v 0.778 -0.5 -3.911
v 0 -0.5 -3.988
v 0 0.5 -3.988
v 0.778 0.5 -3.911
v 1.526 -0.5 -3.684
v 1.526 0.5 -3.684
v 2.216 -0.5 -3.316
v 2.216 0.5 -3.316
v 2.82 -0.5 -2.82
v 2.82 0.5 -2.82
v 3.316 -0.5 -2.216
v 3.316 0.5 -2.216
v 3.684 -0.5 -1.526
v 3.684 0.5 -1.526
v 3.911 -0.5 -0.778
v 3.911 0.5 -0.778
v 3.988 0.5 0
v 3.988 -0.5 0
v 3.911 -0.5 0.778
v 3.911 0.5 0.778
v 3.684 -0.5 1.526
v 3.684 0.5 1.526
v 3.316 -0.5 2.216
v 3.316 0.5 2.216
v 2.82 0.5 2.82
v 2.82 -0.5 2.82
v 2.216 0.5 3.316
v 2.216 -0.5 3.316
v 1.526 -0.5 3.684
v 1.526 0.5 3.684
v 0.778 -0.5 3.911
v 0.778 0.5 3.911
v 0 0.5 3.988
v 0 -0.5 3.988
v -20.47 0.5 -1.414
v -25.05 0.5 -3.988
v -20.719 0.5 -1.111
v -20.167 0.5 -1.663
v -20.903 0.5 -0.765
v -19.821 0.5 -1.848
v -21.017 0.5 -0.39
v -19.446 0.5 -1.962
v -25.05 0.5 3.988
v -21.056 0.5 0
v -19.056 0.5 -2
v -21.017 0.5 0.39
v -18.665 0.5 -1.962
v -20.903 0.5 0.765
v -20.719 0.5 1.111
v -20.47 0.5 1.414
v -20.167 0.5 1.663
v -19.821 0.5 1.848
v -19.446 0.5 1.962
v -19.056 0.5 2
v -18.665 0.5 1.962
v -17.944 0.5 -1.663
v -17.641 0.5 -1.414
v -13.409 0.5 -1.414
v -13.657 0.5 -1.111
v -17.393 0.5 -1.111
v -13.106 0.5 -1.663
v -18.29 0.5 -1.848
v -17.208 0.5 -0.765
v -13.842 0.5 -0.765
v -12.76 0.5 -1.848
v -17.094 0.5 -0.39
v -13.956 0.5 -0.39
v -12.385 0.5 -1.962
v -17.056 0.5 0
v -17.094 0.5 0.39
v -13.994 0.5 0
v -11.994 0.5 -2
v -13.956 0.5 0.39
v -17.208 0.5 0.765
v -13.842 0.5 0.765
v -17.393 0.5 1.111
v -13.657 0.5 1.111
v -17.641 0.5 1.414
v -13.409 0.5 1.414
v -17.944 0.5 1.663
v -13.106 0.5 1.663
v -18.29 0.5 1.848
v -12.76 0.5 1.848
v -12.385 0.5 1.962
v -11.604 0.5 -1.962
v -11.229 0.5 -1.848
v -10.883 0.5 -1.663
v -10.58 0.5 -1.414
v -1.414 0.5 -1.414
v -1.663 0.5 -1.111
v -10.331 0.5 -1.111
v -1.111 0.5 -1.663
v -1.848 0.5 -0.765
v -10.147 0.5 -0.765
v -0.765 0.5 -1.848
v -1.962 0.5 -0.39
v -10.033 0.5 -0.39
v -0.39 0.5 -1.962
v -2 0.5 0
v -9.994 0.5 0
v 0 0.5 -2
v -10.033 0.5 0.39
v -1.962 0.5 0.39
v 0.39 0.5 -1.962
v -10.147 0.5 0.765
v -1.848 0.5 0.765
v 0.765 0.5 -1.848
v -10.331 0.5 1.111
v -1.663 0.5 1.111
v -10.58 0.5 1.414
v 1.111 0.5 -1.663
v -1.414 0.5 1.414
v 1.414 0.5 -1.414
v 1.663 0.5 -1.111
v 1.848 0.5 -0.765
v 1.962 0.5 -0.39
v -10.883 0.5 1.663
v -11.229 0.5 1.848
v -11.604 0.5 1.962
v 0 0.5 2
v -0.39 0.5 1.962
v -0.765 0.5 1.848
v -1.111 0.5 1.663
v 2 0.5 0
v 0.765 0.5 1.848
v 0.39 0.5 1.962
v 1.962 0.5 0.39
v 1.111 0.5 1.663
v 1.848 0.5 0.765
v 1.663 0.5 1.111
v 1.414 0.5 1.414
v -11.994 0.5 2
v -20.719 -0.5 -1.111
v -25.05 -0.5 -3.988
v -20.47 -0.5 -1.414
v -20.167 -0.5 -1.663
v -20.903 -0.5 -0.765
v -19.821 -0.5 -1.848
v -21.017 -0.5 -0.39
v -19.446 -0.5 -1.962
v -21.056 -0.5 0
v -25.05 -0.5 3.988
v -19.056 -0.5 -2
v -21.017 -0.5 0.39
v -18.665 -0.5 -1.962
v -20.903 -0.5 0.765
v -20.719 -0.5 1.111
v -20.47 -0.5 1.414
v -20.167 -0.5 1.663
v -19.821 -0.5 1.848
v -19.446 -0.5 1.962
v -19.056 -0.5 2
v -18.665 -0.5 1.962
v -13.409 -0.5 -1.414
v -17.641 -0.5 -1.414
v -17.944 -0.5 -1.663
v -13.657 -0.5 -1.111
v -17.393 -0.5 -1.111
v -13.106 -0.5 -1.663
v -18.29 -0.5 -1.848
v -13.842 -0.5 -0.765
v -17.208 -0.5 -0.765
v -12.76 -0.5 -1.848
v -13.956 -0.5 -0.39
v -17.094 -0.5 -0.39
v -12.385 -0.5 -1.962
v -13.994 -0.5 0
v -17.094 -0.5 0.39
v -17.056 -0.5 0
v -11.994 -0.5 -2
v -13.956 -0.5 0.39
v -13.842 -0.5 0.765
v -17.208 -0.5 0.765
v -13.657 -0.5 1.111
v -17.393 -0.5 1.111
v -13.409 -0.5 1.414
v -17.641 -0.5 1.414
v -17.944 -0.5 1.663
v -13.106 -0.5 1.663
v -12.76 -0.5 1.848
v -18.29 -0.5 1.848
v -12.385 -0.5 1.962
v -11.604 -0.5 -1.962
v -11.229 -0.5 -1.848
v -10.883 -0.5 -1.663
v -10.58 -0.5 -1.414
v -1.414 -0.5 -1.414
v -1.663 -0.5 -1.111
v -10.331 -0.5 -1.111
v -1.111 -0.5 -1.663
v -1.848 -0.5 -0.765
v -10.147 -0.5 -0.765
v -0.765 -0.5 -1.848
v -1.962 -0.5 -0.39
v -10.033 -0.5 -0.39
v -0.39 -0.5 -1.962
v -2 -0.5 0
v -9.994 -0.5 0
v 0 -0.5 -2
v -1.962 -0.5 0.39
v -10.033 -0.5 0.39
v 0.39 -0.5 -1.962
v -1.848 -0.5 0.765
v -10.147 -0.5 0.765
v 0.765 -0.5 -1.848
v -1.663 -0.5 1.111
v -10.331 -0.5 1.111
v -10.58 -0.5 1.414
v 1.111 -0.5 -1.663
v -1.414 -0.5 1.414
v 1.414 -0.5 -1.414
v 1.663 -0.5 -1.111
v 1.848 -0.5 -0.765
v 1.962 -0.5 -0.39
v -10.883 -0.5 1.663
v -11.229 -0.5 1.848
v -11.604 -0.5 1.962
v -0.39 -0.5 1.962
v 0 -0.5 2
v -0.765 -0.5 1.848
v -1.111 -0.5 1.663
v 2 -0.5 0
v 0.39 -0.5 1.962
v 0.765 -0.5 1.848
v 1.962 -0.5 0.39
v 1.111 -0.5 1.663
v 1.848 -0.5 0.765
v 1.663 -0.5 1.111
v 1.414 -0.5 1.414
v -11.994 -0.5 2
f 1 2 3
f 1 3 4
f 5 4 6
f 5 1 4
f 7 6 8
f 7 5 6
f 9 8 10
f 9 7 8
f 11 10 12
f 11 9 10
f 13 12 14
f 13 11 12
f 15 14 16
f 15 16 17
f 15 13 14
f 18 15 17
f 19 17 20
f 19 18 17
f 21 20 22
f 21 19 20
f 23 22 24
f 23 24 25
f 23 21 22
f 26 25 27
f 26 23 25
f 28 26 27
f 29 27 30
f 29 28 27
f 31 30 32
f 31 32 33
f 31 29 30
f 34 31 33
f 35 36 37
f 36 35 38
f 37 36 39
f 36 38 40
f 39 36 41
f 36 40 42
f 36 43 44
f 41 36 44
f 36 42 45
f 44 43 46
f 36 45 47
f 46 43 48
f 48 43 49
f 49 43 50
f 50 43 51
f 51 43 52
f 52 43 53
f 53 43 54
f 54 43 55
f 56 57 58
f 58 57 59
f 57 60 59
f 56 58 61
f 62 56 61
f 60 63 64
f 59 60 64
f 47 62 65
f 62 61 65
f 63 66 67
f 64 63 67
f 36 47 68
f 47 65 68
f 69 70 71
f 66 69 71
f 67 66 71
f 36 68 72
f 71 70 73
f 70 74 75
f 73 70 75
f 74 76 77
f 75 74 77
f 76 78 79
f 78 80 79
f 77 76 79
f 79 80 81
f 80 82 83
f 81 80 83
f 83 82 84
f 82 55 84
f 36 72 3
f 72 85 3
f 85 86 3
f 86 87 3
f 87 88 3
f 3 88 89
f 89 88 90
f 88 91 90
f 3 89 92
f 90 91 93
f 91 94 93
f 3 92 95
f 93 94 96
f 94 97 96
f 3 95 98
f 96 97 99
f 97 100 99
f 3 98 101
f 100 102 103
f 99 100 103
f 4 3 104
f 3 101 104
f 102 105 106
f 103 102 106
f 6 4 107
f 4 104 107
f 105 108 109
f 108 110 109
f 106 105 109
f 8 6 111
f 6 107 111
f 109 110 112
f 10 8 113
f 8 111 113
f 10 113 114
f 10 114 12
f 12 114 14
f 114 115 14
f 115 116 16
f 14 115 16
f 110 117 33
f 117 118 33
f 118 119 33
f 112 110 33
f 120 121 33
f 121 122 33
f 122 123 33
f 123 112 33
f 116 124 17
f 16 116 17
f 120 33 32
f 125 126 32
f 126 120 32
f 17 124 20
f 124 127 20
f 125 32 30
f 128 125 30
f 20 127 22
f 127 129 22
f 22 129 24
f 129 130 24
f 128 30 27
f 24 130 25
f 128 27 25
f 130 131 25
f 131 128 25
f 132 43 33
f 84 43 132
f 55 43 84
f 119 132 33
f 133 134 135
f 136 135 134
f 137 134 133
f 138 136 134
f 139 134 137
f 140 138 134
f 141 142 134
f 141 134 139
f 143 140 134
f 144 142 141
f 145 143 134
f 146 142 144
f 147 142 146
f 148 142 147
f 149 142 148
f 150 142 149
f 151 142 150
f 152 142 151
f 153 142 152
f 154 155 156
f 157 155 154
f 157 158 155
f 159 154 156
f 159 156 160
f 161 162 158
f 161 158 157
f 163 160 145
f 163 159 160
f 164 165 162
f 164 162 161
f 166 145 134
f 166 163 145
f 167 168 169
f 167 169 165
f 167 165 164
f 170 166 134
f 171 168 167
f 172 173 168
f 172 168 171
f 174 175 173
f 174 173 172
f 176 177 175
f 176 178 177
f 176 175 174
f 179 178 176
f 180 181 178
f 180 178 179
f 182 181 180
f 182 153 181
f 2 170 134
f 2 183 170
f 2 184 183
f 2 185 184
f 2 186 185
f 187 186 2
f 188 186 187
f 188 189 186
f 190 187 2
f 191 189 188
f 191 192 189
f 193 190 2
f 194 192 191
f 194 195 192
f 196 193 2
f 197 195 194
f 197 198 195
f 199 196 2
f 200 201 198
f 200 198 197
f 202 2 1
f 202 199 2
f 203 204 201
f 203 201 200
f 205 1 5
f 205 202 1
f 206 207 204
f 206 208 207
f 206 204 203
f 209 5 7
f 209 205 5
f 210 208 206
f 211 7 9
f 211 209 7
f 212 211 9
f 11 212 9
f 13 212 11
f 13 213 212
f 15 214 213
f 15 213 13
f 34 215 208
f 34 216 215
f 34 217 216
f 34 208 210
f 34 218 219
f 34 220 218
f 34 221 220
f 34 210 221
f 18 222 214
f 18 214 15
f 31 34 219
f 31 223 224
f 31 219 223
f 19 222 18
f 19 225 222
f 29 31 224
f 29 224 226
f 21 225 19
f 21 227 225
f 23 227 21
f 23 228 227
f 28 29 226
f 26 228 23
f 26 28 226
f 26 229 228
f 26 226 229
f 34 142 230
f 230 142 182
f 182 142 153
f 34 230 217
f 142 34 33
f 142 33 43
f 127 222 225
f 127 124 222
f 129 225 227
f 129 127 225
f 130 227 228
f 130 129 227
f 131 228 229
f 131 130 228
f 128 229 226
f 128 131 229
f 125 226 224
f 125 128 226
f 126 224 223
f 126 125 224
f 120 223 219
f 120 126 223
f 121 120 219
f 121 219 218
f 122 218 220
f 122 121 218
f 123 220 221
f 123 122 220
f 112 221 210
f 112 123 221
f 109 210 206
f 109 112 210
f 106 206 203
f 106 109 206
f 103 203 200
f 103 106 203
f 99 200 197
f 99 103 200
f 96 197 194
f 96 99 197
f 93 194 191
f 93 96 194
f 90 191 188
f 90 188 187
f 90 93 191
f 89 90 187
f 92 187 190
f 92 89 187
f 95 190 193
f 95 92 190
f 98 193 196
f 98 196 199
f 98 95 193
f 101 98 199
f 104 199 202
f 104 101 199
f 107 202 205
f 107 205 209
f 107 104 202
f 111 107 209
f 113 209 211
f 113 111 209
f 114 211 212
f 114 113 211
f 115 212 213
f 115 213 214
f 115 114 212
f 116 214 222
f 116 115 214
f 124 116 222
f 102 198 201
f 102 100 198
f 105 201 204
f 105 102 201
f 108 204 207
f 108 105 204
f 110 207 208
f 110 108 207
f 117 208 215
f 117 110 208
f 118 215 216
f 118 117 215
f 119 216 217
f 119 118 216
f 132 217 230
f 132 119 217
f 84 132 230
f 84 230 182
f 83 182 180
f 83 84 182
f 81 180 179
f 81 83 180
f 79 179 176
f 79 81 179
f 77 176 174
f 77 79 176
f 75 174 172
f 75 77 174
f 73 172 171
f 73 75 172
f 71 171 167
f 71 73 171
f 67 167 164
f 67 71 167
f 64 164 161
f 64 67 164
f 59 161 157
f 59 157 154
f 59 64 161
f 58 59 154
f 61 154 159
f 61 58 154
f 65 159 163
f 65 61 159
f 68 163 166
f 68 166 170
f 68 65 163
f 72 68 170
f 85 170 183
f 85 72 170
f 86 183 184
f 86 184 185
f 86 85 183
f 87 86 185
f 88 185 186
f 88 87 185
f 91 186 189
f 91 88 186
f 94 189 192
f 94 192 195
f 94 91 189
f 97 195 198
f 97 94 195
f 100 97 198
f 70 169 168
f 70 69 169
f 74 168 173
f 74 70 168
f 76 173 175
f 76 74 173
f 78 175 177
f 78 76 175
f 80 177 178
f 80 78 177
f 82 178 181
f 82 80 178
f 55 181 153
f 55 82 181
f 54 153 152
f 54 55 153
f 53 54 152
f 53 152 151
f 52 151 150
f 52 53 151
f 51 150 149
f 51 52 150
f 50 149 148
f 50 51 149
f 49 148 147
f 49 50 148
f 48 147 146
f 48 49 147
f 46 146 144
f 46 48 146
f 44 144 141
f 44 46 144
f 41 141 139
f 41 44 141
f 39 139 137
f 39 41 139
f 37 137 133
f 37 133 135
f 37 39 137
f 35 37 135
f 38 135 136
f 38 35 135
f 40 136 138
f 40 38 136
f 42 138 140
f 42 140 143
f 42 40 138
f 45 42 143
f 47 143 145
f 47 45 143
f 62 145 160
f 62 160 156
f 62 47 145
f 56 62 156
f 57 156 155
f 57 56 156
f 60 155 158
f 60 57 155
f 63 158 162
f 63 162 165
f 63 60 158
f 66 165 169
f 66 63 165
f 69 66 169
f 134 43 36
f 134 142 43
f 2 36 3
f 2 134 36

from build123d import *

# Parameters (mm, degrees)
F0_R     = 2
F1_DEPTH = 0.5


with BuildPart() as f1:
    # F0 (on Front) → F1 (new body, symmetric)
    with BuildSketch(Plane.XZ):
        with BuildLine():
            Line((-25.05, -3.9878), (0, -3.9878))
            ThreePointArc((0, -3.9878), (3.9878, 0), (0, 3.9878))
            Line((0, 3.9878), (-25.05, 3.9878))
            Line((-25.05, 3.9878), (-25.05, -3.9878))
        make_face()
        with Locations((-19.0556, 0)):
            Circle(F0_R, mode=Mode.SUBTRACT)
        with Locations((-11.9944, 0)):
            Circle(F0_R, mode=Mode.SUBTRACT)
        Circle(F0_R, mode=Mode.SUBTRACT)
    extrude(amount=F1_DEPTH, both=True)


solid = f1.part
